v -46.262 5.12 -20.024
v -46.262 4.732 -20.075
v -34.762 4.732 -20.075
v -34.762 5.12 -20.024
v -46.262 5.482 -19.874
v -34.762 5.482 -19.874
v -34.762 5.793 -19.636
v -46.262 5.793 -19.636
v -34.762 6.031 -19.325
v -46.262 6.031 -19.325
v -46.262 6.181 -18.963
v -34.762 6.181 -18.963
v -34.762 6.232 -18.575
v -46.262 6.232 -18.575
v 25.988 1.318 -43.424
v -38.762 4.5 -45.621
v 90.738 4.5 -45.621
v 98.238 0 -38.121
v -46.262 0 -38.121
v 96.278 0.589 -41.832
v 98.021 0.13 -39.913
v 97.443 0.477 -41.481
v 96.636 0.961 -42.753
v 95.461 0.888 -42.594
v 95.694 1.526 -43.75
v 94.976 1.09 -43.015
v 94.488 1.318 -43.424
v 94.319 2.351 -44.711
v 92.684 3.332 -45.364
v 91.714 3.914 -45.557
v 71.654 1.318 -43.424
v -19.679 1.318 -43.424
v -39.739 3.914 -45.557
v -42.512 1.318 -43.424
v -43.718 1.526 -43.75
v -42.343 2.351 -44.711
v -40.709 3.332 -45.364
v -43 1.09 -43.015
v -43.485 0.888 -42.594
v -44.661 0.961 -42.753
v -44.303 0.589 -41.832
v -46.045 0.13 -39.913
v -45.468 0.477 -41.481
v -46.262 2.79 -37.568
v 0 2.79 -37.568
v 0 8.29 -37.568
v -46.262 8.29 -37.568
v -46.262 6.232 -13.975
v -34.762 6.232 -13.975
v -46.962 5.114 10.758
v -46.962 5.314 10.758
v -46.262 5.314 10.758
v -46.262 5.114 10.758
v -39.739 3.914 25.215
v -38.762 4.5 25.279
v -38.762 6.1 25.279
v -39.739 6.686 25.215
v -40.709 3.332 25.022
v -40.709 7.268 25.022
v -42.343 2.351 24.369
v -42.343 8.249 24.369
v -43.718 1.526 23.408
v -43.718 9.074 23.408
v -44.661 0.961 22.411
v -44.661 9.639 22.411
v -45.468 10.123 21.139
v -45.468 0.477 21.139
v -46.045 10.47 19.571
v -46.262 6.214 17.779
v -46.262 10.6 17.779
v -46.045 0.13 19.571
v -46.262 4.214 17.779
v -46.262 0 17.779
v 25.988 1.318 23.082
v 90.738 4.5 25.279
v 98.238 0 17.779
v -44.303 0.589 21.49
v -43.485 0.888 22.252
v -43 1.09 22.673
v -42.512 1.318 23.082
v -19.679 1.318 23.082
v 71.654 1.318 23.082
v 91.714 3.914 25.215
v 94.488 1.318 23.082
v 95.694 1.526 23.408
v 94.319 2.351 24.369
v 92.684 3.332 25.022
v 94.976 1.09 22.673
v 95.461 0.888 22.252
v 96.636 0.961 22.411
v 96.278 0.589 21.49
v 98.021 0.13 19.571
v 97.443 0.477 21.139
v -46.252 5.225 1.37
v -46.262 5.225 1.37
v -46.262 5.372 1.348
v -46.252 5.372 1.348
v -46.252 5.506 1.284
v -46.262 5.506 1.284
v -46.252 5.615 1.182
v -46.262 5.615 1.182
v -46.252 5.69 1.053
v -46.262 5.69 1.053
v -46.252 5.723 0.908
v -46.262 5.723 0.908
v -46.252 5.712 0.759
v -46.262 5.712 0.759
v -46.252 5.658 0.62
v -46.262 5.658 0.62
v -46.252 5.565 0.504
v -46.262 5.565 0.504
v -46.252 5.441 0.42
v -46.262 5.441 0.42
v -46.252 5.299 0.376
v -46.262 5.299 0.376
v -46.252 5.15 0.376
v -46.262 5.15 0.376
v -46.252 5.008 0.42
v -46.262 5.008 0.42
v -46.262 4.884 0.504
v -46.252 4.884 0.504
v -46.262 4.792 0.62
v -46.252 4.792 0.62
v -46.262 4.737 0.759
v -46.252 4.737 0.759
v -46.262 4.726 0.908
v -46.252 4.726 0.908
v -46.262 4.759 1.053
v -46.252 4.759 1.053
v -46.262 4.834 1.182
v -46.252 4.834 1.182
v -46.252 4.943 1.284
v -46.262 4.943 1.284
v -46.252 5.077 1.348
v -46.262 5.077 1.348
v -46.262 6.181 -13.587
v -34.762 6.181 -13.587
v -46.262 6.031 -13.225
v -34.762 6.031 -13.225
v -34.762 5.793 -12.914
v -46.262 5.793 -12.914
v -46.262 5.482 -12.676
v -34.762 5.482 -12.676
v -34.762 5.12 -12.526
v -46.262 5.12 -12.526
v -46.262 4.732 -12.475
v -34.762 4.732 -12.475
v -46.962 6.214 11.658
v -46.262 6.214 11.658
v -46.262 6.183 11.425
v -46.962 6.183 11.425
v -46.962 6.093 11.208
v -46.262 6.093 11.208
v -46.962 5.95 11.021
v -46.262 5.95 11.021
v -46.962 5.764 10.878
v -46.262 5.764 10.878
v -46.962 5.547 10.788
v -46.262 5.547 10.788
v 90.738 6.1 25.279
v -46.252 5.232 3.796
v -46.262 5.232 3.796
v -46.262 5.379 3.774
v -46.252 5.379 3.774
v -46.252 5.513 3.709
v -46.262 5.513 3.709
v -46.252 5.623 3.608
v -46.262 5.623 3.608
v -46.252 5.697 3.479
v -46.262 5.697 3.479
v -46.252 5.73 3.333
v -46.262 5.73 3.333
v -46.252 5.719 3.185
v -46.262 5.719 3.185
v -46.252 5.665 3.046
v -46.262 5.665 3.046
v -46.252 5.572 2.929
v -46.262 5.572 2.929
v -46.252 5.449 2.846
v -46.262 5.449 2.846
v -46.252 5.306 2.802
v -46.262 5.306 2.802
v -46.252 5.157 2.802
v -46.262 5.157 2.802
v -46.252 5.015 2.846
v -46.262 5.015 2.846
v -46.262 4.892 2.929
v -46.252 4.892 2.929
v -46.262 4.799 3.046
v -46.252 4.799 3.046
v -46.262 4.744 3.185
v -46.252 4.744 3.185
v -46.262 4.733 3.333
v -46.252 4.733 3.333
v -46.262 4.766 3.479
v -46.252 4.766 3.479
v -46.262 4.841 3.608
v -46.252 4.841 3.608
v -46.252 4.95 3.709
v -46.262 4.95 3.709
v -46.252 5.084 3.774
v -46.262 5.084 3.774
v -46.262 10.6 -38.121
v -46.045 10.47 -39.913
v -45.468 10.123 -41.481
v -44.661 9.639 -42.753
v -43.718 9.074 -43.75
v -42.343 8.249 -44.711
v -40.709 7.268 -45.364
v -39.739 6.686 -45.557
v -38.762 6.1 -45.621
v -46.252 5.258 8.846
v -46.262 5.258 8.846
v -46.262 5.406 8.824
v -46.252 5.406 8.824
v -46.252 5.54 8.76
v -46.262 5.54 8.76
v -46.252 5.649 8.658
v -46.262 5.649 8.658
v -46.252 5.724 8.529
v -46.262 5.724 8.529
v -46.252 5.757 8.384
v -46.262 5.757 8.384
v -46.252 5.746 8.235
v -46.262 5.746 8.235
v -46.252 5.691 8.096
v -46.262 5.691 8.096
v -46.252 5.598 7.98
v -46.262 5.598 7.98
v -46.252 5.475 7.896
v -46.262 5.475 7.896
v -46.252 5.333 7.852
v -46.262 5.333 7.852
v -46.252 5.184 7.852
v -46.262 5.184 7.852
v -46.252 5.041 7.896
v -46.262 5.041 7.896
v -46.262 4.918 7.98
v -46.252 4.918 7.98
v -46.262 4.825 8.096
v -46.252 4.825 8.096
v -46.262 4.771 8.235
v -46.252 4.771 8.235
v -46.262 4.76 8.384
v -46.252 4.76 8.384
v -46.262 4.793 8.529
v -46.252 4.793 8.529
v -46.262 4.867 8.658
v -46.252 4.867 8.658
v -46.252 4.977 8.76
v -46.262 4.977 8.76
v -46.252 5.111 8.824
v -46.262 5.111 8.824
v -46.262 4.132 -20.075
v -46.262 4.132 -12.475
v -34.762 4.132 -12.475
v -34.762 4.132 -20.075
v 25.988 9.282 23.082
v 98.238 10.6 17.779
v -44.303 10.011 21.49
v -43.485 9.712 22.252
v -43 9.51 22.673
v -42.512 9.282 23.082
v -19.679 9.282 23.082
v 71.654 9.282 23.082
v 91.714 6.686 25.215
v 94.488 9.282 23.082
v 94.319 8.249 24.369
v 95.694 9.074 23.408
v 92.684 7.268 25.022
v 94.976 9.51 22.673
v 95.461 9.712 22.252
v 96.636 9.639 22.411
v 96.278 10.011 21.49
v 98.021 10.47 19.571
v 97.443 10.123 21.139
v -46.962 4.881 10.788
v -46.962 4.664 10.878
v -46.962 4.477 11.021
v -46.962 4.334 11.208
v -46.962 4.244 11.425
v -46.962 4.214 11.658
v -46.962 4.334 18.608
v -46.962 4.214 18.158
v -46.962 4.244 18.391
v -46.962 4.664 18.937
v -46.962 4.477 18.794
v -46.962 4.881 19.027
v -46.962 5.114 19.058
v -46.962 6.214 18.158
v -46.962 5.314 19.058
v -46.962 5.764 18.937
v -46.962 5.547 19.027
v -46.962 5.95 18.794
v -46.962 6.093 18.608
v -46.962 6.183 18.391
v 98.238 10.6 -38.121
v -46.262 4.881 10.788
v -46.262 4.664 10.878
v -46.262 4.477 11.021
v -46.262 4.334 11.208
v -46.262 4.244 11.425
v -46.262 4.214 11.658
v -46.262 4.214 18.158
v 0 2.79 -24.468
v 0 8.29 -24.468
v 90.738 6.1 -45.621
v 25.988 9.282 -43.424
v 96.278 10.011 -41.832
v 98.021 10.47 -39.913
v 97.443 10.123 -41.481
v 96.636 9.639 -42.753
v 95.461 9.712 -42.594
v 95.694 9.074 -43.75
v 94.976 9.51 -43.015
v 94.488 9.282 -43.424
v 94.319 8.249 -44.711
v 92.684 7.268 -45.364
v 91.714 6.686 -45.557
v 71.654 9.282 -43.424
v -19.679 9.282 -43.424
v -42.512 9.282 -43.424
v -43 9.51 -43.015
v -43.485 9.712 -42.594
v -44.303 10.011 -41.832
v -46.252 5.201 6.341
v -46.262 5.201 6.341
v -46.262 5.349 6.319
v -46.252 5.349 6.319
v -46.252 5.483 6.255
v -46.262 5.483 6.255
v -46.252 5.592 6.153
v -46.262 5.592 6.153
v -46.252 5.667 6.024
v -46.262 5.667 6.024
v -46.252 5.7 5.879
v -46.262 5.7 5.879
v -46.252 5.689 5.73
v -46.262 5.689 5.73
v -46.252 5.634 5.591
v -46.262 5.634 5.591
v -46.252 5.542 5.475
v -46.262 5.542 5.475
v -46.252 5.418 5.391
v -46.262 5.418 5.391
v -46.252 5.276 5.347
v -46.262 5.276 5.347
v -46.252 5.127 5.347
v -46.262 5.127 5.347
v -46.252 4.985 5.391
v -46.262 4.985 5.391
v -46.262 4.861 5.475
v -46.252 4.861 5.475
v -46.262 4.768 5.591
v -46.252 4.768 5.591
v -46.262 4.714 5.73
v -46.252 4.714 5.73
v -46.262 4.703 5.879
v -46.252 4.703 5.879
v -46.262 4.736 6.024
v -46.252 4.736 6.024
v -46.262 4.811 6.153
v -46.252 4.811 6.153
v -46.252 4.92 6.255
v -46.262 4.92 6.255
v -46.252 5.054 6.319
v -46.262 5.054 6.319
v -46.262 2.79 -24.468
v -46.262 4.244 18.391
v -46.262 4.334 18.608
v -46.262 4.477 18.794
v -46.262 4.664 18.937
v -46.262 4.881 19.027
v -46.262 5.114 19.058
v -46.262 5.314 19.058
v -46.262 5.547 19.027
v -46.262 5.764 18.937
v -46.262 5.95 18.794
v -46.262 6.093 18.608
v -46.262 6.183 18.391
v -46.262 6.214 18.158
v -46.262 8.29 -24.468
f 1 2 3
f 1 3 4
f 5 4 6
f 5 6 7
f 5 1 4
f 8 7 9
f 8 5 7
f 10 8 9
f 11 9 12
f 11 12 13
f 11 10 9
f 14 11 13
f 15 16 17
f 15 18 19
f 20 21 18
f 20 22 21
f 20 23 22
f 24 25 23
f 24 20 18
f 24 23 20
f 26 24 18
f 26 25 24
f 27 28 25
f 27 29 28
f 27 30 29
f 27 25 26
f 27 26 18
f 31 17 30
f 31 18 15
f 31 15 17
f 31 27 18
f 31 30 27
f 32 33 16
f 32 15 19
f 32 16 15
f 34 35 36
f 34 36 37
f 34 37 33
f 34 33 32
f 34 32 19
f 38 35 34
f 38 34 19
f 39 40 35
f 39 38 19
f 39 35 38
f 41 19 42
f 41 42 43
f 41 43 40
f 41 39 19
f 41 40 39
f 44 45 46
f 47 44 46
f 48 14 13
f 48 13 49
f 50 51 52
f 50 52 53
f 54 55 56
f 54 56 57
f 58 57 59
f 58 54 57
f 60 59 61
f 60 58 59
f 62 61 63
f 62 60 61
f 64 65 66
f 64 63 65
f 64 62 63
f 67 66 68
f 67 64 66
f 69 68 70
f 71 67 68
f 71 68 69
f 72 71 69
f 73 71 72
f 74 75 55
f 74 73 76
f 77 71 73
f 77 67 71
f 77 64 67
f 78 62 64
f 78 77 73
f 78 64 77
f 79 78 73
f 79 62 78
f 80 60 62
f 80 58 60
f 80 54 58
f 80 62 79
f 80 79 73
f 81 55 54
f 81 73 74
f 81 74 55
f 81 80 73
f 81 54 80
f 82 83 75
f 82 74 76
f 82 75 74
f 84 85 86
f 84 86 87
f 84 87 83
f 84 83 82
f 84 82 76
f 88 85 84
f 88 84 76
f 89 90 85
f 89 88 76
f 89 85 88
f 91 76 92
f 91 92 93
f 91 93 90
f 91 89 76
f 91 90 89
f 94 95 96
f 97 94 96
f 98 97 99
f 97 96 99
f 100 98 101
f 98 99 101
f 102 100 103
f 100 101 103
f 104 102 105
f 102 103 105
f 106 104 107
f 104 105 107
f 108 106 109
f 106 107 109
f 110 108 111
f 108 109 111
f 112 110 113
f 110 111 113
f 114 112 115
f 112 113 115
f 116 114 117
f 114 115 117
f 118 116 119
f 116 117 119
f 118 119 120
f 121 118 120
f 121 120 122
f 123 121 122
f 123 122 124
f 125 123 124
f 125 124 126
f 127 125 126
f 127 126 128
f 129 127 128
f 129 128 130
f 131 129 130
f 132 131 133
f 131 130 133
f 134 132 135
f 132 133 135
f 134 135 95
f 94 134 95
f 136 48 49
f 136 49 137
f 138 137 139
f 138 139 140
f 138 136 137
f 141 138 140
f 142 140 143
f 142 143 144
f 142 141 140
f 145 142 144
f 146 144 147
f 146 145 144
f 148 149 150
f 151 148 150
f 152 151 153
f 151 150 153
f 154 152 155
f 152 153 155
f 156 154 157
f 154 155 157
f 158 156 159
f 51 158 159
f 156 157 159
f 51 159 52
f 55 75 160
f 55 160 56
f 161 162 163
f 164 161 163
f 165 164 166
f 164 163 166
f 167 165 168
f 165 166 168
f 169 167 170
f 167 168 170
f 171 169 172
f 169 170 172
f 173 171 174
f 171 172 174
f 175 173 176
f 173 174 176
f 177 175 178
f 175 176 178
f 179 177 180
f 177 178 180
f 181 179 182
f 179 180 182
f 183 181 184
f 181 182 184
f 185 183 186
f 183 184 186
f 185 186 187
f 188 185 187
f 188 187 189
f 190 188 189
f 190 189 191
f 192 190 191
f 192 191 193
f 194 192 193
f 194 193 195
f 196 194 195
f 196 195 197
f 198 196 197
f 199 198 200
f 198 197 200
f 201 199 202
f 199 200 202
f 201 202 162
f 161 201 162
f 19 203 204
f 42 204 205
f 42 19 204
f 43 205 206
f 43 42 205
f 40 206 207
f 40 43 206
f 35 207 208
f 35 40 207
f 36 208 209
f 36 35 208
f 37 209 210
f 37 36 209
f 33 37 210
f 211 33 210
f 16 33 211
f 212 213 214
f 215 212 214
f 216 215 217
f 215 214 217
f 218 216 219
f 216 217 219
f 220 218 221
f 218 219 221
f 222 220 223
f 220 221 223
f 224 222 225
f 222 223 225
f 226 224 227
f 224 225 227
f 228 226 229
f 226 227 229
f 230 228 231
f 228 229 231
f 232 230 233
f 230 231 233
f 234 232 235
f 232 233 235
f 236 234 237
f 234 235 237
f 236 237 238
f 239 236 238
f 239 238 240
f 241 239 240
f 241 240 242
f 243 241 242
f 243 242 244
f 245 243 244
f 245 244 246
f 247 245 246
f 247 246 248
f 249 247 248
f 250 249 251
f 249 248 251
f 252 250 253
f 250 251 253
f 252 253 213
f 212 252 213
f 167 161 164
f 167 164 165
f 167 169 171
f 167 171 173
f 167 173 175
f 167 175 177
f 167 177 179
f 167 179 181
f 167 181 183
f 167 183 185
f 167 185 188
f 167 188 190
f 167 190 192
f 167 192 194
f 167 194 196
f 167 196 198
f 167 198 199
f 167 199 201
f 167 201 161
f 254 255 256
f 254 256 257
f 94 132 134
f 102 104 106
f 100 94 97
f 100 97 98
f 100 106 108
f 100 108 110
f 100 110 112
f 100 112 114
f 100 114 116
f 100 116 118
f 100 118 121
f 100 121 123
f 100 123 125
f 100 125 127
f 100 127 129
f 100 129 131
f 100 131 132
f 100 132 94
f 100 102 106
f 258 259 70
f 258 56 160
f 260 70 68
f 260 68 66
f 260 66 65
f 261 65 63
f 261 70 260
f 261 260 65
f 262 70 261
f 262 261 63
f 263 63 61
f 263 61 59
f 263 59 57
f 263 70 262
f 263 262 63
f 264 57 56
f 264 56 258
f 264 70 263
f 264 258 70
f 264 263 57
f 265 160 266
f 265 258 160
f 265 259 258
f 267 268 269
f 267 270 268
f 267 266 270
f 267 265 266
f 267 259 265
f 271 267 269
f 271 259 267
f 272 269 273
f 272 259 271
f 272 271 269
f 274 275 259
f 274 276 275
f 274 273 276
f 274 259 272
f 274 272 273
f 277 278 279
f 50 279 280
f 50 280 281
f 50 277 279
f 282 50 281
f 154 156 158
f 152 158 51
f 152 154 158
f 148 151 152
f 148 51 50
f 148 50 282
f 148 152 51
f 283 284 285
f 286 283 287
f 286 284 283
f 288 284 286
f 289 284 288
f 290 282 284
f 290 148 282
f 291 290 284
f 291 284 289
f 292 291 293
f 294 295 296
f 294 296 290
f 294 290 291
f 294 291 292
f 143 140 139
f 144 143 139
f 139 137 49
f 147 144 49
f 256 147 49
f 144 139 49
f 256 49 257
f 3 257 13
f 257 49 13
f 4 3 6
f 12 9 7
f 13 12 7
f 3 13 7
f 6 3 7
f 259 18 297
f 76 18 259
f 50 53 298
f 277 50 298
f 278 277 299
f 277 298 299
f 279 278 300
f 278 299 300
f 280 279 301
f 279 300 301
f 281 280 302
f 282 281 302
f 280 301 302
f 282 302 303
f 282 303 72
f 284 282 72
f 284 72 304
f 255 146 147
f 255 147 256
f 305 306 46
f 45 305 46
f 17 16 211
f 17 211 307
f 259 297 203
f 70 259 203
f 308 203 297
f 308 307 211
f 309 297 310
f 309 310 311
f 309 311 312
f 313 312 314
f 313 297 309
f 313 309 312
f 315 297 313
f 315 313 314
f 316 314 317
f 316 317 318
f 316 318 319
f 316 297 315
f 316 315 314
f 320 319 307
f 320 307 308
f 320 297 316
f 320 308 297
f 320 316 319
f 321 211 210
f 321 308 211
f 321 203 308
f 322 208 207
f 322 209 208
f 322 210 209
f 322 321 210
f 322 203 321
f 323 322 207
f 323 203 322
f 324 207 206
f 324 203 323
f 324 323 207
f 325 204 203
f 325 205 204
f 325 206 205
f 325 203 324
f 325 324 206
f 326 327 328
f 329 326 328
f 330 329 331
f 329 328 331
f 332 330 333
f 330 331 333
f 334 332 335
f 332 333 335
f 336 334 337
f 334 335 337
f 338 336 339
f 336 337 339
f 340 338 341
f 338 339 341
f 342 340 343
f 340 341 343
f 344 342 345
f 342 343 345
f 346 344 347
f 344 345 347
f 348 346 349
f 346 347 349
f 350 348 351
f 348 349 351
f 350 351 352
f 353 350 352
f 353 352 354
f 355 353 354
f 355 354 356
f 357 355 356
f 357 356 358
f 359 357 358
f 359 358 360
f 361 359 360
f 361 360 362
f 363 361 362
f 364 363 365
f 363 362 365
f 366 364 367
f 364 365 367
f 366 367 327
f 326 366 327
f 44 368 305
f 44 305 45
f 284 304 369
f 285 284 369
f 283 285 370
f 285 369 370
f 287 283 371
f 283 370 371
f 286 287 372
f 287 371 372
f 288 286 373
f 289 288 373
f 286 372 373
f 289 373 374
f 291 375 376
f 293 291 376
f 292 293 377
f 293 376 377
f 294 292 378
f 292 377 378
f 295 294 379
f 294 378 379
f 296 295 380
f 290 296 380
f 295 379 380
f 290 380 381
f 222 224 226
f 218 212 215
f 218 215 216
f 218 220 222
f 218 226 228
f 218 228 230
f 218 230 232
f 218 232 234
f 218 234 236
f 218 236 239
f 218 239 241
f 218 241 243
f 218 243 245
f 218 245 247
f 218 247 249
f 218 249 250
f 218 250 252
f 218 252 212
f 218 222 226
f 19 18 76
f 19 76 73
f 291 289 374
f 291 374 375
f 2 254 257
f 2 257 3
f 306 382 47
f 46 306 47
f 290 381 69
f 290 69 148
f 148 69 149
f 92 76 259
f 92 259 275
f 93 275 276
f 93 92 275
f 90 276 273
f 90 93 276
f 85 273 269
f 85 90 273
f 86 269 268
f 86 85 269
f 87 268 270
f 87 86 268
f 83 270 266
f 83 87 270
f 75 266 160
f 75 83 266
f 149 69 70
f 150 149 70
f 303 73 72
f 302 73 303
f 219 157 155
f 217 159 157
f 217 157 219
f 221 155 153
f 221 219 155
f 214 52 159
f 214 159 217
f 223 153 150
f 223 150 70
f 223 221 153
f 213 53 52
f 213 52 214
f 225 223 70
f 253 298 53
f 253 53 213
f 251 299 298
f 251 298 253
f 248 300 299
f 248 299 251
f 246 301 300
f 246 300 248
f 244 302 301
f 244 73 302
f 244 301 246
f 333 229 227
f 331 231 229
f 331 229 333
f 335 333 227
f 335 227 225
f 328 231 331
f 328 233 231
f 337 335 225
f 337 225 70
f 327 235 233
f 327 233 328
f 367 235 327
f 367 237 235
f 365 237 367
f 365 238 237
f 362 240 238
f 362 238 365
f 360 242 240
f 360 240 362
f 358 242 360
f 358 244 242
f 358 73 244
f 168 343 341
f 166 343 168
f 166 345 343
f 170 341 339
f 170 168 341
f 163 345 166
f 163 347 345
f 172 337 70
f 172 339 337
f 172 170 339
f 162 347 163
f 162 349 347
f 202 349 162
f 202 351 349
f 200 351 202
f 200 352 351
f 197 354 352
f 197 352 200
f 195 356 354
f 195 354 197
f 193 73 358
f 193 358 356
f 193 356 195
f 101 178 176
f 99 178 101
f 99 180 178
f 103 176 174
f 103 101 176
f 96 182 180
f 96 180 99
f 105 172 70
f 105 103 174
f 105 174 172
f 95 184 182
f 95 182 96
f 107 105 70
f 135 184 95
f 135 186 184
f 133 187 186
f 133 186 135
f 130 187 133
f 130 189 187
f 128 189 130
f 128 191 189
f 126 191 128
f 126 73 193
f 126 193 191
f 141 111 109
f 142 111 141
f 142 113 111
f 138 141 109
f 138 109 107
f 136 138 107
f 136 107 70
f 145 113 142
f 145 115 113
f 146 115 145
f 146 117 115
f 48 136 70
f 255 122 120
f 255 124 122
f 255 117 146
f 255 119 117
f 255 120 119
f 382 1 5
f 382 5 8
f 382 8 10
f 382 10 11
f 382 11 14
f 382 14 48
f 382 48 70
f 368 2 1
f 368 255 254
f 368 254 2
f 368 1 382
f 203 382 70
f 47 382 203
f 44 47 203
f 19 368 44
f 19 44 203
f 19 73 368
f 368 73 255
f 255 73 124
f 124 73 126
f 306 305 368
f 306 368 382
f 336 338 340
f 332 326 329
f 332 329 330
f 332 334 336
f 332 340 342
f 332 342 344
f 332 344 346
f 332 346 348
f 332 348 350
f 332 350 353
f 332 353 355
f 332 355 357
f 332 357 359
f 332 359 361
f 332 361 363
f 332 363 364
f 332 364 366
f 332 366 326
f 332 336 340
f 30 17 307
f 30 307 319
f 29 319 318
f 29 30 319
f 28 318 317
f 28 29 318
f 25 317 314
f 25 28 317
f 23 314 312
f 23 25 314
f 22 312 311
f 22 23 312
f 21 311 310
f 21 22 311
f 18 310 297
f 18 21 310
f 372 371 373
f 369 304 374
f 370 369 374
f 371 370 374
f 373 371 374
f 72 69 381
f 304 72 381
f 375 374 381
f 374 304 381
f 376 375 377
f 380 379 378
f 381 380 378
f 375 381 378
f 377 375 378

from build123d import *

# Parameters (mm, degrees)
BOSS_EXTRUDE1_DEPTH     = 10.6
FILLET4_SIZE            = 4.5
FILLET4_SIZE_2          = 7.5
FILLET3_SIZE            = 7.5
FILLET3_SIZE_2          = 4.5
FILLET5_START           = -47
FILLET5_DEPTH           = 146
FILLET6_START           = -47
FILLET6_DEPTH           = 146
CUT_EXTRUDE1_DEPTH      = 0.0001
CUT_EXTRUDE1_DEPTH_BACK = 47.330240243
USB_OUTPUT_W            = 13.1
USB_OUTPUT_H            = 5.5
CUT_EXTRUDE2_DEPTH      = 11.5
BOSS_EXTRUDE2_DEPTH     = 0.7
SKETCH6_R               = 0.5
CUT_EXTRUDE3_DEPTH      = 0.01
SKETCH8_R               = 0.5
CUT_EXTRUDE4_DEPTH      = 0.01
SKETCH9_R               = 0.5
CUT_EXTRUDE5_DEPTH      = 0.01
SKETCH11_R              = 0.5
CUT_EXTRUDE7_DEPTH      = 0.01


with BuildPart() as part:
    # Sketch1 → Boss-Extrude1 (new body)
    with BuildSketch(Plane(origin=(0, 0, 0), x_dir=(1, 0, 0), z_dir=(0, 1, 0))):
        with BuildLine():
            Line((-38.762171266, 45.621027844), (90.737828734, 45.621027844))
            ThreePointArc((90.737828734, 45.621027844), (96.041129593, 43.424328703), (98.237828734, 38.121027844))
            Line((98.237828734, 38.121027844), (98.237828734, -17.778972156))
            ThreePointArc((98.237828734, -17.778972156), (96.041129593, -23.082273015), (90.737828734, -25.278972156))
            Line((90.737828734, -25.278972156), (-38.762171266, -25.278972156))
            ThreePointArc((-38.762171266, -25.278972156), (-44.065472124, -23.082273015), (-46.262171266, -17.778972156))
            Line((-46.262171266, -17.778972156), (-46.262171266, 38.121027844))
            ThreePointArc((-46.262171266, 38.121027844), (-44.065472124, 43.424328703), (-38.762171266, 45.621027844))
        make_face()
    extrude(amount=BOSS_EXTRUDE1_DEPTH)

    # Fillet4
    # a fillet whose section is not a circle: 7.5, 4.5 mm, written as the material it takes off along each edge
    with BuildSketch(Plane(origin=(109.487828734, 0, 25.278972156), x_dir=(0, 1, 0), z_dir=(-1, 0, 0))) as fillet4_piece_1:
        with BuildLine():
            Bezier((FILLET4_SIZE, 0), (0, 0), (0, FILLET4_SIZE_2), weights=[1, 0.707106781, 1])
            Line((0, FILLET4_SIZE_2), (0, 0))
            Line((0, 0), (FILLET4_SIZE, 0))
        make_face()
    extrude(amount=167, mode=Mode.SUBTRACT)

    # Fillet3
    # a fillet whose section is not a circle: 7.5, 4.5 mm, written as the material it takes off along each edge
    with BuildSketch(Plane(origin=(109.487828734, 10.6, 25.278972156), x_dir=(0, 0, -1), z_dir=(-1, 0, 0))) as fillet3_piece_1:
        with BuildLine():
            Bezier((FILLET3_SIZE, 0), (0, 0), (0, FILLET3_SIZE_2), weights=[1, 0.707106781, 1])
            Line((0, FILLET3_SIZE_2), (0, 0))
            Line((0, 0), (FILLET3_SIZE, 0))
        make_face()
    extrude(amount=167, mode=Mode.SUBTRACT)

    # Fillet5: read off the stored shape, not the designer's step
    # Fillet5 outline → Fillet5 (cut)
    with BuildSketch(Plane.YZ.offset(FILLET5_START)):
        with BuildLine():
            Line((10.6, -45.621027844), (10.6, -38.121027844))
            add(Edge.make_bspline(
                [(10.6, -38.121027844), (10.6, -45.621027844), (6.1, -45.621027844)],
                knots=[0, 0, 0, 1, 1, 1], degree=2, weights=[1, 0.707106781, 1]))
            Line((6.1, -45.621027844), (10.6, -45.621027844))
        make_face()
    extrude(amount=FILLET5_DEPTH, mode=Mode.SUBTRACT)

    # Fillet6: read off the stored shape, not the designer's step
    # Fillet6 outline → Fillet6 (cut)
    with BuildSketch(Plane.YZ.offset(FILLET6_START)):
        with BuildLine():
            Line((0, -45.621027844), (4.5, -45.621027844))
            add(Edge.make_bspline(
                [(4.5, -45.621027844), (0, -45.621027844), (0, -38.121027844)],
                knots=[0, 0, 0, 1, 1, 1], degree=2, weights=[1, 0.707106781, 1]))
            Line((0, -38.121027844), (0, -45.621027844))
        make_face()
    extrude(amount=FILLET6_DEPTH, mode=Mode.SUBTRACT)

    # USB Output → Cut-Extrude1 (cut, two sides: drawn at the far end of the back side and taken through both)
    with BuildSketch(Plane(origin=(0, 0, -28.925486843), x_dir=(0, 0, -1), z_dir=(1, 0, 0)).offset(-CUT_EXTRUDE1_DEPTH_BACK)):
        with Locations((2.092448173, 5.540415323)):
            Rectangle(USB_OUTPUT_W, USB_OUTPUT_H)
    extrude(amount=CUT_EXTRUDE1_DEPTH + CUT_EXTRUDE1_DEPTH_BACK, mode=Mode.SUBTRACT)

    # USB Charger → Cut-Extrude2 (cut)
    with BuildSketch(Plane.ZY.offset(46.262171266)):
        with BuildLine():
            Line((-18.574888724, 6.232091877), (-13.974888724, 6.232091877))
            ThreePointArc((-13.974888724, 6.232091877), (-12.914228552, 5.792752049), (-12.474888724, 4.732091877))
            Line((-12.474888724, 4.732091877), (-12.474888724, 4.132091877))
            Line((-12.474888724, 4.132091877), (-20.074888724, 4.132091877))
            Line((-20.074888724, 4.132091877), (-20.074888724, 4.732091877))
            ThreePointArc((-20.074888724, 4.732091877), (-19.635548896, 5.792752049), (-18.574888724, 6.232091877))
        make_face()
    extrude(amount=-CUT_EXTRUDE2_DEPTH, mode=Mode.SUBTRACT)

    # Sketch4 → Boss-Extrude2 (add)
    with BuildSketch(Plane.ZY.offset(46.262171266)):
        with BuildLine():
            Line((18.15777008, 6.213830992), (11.65777008, 6.213830992))
            ThreePointArc((11.65777008, 6.213830992), (11.021373976, 5.950227095), (10.75777008, 5.313830992))
            Line((10.75777008, 5.313830992), (10.75777008, 5.113830992))
            ThreePointArc((10.75777008, 5.113830992), (11.021373976, 4.477434889), (11.65777008, 4.213830992))
            Line((11.65777008, 4.213830992), (18.15777008, 4.213830992))
            ThreePointArc((18.15777008, 4.213830992), (18.794166183, 4.477434889), (19.05777008, 5.113830992))
            Line((19.05777008, 5.113830992), (19.05777008, 5.313830992))
            ThreePointArc((19.05777008, 5.313830992), (18.794166183, 5.950227095), (18.15777008, 6.213830992))
        make_face()
    extrude(amount=BOSS_EXTRUDE2_DEPTH)

    # Sketch6 → Cut-Extrude3 (cut)
    with BuildSketch(Plane(origin=(-46.262171266, 0, -7.484845673), x_dir=(0, 0, 1), z_dir=(-1, 0, 0))):
        with Locations((8.355271575, 5.224549503)):
            Circle(SKETCH6_R)
    extrude(amount=-CUT_EXTRUDE3_DEPTH, mode=Mode.SUBTRACT)

    # Sketch8 → Cut-Extrude4 (cut)
    with BuildSketch(Plane.ZY.offset(46.262171266)):
        with Locations((8.346381579, 5.258350764)):
            Circle(SKETCH8_R)
    extrude(amount=-CUT_EXTRUDE4_DEPTH, mode=Mode.SUBTRACT)

    # Sketch9 → Cut-Extrude5 (cut)
    with BuildSketch(Plane(origin=(-46.262171266, 1.999999249, 4.454543781), x_dir=(0, 0, 1), z_dir=(-1, 0, 0))):
        with Locations((1.386907241, 3.201460838)):
            Circle(SKETCH9_R)
    extrude(amount=-CUT_EXTRUDE5_DEPTH, mode=Mode.SUBTRACT)

    # Sketch11 → Cut-Extrude7 (cut)
    with BuildSketch(Plane(origin=(-46.262171266, 2.666665665, -5.363634349), x_dir=(0, 0, 1), z_dir=(-1, 0, 0))):
        with Locations((8.659631782, 2.56509744)):
            Circle(SKETCH11_R)
    extrude(amount=-CUT_EXTRUDE7_DEPTH, mode=Mode.SUBTRACT)


solid = part.part
